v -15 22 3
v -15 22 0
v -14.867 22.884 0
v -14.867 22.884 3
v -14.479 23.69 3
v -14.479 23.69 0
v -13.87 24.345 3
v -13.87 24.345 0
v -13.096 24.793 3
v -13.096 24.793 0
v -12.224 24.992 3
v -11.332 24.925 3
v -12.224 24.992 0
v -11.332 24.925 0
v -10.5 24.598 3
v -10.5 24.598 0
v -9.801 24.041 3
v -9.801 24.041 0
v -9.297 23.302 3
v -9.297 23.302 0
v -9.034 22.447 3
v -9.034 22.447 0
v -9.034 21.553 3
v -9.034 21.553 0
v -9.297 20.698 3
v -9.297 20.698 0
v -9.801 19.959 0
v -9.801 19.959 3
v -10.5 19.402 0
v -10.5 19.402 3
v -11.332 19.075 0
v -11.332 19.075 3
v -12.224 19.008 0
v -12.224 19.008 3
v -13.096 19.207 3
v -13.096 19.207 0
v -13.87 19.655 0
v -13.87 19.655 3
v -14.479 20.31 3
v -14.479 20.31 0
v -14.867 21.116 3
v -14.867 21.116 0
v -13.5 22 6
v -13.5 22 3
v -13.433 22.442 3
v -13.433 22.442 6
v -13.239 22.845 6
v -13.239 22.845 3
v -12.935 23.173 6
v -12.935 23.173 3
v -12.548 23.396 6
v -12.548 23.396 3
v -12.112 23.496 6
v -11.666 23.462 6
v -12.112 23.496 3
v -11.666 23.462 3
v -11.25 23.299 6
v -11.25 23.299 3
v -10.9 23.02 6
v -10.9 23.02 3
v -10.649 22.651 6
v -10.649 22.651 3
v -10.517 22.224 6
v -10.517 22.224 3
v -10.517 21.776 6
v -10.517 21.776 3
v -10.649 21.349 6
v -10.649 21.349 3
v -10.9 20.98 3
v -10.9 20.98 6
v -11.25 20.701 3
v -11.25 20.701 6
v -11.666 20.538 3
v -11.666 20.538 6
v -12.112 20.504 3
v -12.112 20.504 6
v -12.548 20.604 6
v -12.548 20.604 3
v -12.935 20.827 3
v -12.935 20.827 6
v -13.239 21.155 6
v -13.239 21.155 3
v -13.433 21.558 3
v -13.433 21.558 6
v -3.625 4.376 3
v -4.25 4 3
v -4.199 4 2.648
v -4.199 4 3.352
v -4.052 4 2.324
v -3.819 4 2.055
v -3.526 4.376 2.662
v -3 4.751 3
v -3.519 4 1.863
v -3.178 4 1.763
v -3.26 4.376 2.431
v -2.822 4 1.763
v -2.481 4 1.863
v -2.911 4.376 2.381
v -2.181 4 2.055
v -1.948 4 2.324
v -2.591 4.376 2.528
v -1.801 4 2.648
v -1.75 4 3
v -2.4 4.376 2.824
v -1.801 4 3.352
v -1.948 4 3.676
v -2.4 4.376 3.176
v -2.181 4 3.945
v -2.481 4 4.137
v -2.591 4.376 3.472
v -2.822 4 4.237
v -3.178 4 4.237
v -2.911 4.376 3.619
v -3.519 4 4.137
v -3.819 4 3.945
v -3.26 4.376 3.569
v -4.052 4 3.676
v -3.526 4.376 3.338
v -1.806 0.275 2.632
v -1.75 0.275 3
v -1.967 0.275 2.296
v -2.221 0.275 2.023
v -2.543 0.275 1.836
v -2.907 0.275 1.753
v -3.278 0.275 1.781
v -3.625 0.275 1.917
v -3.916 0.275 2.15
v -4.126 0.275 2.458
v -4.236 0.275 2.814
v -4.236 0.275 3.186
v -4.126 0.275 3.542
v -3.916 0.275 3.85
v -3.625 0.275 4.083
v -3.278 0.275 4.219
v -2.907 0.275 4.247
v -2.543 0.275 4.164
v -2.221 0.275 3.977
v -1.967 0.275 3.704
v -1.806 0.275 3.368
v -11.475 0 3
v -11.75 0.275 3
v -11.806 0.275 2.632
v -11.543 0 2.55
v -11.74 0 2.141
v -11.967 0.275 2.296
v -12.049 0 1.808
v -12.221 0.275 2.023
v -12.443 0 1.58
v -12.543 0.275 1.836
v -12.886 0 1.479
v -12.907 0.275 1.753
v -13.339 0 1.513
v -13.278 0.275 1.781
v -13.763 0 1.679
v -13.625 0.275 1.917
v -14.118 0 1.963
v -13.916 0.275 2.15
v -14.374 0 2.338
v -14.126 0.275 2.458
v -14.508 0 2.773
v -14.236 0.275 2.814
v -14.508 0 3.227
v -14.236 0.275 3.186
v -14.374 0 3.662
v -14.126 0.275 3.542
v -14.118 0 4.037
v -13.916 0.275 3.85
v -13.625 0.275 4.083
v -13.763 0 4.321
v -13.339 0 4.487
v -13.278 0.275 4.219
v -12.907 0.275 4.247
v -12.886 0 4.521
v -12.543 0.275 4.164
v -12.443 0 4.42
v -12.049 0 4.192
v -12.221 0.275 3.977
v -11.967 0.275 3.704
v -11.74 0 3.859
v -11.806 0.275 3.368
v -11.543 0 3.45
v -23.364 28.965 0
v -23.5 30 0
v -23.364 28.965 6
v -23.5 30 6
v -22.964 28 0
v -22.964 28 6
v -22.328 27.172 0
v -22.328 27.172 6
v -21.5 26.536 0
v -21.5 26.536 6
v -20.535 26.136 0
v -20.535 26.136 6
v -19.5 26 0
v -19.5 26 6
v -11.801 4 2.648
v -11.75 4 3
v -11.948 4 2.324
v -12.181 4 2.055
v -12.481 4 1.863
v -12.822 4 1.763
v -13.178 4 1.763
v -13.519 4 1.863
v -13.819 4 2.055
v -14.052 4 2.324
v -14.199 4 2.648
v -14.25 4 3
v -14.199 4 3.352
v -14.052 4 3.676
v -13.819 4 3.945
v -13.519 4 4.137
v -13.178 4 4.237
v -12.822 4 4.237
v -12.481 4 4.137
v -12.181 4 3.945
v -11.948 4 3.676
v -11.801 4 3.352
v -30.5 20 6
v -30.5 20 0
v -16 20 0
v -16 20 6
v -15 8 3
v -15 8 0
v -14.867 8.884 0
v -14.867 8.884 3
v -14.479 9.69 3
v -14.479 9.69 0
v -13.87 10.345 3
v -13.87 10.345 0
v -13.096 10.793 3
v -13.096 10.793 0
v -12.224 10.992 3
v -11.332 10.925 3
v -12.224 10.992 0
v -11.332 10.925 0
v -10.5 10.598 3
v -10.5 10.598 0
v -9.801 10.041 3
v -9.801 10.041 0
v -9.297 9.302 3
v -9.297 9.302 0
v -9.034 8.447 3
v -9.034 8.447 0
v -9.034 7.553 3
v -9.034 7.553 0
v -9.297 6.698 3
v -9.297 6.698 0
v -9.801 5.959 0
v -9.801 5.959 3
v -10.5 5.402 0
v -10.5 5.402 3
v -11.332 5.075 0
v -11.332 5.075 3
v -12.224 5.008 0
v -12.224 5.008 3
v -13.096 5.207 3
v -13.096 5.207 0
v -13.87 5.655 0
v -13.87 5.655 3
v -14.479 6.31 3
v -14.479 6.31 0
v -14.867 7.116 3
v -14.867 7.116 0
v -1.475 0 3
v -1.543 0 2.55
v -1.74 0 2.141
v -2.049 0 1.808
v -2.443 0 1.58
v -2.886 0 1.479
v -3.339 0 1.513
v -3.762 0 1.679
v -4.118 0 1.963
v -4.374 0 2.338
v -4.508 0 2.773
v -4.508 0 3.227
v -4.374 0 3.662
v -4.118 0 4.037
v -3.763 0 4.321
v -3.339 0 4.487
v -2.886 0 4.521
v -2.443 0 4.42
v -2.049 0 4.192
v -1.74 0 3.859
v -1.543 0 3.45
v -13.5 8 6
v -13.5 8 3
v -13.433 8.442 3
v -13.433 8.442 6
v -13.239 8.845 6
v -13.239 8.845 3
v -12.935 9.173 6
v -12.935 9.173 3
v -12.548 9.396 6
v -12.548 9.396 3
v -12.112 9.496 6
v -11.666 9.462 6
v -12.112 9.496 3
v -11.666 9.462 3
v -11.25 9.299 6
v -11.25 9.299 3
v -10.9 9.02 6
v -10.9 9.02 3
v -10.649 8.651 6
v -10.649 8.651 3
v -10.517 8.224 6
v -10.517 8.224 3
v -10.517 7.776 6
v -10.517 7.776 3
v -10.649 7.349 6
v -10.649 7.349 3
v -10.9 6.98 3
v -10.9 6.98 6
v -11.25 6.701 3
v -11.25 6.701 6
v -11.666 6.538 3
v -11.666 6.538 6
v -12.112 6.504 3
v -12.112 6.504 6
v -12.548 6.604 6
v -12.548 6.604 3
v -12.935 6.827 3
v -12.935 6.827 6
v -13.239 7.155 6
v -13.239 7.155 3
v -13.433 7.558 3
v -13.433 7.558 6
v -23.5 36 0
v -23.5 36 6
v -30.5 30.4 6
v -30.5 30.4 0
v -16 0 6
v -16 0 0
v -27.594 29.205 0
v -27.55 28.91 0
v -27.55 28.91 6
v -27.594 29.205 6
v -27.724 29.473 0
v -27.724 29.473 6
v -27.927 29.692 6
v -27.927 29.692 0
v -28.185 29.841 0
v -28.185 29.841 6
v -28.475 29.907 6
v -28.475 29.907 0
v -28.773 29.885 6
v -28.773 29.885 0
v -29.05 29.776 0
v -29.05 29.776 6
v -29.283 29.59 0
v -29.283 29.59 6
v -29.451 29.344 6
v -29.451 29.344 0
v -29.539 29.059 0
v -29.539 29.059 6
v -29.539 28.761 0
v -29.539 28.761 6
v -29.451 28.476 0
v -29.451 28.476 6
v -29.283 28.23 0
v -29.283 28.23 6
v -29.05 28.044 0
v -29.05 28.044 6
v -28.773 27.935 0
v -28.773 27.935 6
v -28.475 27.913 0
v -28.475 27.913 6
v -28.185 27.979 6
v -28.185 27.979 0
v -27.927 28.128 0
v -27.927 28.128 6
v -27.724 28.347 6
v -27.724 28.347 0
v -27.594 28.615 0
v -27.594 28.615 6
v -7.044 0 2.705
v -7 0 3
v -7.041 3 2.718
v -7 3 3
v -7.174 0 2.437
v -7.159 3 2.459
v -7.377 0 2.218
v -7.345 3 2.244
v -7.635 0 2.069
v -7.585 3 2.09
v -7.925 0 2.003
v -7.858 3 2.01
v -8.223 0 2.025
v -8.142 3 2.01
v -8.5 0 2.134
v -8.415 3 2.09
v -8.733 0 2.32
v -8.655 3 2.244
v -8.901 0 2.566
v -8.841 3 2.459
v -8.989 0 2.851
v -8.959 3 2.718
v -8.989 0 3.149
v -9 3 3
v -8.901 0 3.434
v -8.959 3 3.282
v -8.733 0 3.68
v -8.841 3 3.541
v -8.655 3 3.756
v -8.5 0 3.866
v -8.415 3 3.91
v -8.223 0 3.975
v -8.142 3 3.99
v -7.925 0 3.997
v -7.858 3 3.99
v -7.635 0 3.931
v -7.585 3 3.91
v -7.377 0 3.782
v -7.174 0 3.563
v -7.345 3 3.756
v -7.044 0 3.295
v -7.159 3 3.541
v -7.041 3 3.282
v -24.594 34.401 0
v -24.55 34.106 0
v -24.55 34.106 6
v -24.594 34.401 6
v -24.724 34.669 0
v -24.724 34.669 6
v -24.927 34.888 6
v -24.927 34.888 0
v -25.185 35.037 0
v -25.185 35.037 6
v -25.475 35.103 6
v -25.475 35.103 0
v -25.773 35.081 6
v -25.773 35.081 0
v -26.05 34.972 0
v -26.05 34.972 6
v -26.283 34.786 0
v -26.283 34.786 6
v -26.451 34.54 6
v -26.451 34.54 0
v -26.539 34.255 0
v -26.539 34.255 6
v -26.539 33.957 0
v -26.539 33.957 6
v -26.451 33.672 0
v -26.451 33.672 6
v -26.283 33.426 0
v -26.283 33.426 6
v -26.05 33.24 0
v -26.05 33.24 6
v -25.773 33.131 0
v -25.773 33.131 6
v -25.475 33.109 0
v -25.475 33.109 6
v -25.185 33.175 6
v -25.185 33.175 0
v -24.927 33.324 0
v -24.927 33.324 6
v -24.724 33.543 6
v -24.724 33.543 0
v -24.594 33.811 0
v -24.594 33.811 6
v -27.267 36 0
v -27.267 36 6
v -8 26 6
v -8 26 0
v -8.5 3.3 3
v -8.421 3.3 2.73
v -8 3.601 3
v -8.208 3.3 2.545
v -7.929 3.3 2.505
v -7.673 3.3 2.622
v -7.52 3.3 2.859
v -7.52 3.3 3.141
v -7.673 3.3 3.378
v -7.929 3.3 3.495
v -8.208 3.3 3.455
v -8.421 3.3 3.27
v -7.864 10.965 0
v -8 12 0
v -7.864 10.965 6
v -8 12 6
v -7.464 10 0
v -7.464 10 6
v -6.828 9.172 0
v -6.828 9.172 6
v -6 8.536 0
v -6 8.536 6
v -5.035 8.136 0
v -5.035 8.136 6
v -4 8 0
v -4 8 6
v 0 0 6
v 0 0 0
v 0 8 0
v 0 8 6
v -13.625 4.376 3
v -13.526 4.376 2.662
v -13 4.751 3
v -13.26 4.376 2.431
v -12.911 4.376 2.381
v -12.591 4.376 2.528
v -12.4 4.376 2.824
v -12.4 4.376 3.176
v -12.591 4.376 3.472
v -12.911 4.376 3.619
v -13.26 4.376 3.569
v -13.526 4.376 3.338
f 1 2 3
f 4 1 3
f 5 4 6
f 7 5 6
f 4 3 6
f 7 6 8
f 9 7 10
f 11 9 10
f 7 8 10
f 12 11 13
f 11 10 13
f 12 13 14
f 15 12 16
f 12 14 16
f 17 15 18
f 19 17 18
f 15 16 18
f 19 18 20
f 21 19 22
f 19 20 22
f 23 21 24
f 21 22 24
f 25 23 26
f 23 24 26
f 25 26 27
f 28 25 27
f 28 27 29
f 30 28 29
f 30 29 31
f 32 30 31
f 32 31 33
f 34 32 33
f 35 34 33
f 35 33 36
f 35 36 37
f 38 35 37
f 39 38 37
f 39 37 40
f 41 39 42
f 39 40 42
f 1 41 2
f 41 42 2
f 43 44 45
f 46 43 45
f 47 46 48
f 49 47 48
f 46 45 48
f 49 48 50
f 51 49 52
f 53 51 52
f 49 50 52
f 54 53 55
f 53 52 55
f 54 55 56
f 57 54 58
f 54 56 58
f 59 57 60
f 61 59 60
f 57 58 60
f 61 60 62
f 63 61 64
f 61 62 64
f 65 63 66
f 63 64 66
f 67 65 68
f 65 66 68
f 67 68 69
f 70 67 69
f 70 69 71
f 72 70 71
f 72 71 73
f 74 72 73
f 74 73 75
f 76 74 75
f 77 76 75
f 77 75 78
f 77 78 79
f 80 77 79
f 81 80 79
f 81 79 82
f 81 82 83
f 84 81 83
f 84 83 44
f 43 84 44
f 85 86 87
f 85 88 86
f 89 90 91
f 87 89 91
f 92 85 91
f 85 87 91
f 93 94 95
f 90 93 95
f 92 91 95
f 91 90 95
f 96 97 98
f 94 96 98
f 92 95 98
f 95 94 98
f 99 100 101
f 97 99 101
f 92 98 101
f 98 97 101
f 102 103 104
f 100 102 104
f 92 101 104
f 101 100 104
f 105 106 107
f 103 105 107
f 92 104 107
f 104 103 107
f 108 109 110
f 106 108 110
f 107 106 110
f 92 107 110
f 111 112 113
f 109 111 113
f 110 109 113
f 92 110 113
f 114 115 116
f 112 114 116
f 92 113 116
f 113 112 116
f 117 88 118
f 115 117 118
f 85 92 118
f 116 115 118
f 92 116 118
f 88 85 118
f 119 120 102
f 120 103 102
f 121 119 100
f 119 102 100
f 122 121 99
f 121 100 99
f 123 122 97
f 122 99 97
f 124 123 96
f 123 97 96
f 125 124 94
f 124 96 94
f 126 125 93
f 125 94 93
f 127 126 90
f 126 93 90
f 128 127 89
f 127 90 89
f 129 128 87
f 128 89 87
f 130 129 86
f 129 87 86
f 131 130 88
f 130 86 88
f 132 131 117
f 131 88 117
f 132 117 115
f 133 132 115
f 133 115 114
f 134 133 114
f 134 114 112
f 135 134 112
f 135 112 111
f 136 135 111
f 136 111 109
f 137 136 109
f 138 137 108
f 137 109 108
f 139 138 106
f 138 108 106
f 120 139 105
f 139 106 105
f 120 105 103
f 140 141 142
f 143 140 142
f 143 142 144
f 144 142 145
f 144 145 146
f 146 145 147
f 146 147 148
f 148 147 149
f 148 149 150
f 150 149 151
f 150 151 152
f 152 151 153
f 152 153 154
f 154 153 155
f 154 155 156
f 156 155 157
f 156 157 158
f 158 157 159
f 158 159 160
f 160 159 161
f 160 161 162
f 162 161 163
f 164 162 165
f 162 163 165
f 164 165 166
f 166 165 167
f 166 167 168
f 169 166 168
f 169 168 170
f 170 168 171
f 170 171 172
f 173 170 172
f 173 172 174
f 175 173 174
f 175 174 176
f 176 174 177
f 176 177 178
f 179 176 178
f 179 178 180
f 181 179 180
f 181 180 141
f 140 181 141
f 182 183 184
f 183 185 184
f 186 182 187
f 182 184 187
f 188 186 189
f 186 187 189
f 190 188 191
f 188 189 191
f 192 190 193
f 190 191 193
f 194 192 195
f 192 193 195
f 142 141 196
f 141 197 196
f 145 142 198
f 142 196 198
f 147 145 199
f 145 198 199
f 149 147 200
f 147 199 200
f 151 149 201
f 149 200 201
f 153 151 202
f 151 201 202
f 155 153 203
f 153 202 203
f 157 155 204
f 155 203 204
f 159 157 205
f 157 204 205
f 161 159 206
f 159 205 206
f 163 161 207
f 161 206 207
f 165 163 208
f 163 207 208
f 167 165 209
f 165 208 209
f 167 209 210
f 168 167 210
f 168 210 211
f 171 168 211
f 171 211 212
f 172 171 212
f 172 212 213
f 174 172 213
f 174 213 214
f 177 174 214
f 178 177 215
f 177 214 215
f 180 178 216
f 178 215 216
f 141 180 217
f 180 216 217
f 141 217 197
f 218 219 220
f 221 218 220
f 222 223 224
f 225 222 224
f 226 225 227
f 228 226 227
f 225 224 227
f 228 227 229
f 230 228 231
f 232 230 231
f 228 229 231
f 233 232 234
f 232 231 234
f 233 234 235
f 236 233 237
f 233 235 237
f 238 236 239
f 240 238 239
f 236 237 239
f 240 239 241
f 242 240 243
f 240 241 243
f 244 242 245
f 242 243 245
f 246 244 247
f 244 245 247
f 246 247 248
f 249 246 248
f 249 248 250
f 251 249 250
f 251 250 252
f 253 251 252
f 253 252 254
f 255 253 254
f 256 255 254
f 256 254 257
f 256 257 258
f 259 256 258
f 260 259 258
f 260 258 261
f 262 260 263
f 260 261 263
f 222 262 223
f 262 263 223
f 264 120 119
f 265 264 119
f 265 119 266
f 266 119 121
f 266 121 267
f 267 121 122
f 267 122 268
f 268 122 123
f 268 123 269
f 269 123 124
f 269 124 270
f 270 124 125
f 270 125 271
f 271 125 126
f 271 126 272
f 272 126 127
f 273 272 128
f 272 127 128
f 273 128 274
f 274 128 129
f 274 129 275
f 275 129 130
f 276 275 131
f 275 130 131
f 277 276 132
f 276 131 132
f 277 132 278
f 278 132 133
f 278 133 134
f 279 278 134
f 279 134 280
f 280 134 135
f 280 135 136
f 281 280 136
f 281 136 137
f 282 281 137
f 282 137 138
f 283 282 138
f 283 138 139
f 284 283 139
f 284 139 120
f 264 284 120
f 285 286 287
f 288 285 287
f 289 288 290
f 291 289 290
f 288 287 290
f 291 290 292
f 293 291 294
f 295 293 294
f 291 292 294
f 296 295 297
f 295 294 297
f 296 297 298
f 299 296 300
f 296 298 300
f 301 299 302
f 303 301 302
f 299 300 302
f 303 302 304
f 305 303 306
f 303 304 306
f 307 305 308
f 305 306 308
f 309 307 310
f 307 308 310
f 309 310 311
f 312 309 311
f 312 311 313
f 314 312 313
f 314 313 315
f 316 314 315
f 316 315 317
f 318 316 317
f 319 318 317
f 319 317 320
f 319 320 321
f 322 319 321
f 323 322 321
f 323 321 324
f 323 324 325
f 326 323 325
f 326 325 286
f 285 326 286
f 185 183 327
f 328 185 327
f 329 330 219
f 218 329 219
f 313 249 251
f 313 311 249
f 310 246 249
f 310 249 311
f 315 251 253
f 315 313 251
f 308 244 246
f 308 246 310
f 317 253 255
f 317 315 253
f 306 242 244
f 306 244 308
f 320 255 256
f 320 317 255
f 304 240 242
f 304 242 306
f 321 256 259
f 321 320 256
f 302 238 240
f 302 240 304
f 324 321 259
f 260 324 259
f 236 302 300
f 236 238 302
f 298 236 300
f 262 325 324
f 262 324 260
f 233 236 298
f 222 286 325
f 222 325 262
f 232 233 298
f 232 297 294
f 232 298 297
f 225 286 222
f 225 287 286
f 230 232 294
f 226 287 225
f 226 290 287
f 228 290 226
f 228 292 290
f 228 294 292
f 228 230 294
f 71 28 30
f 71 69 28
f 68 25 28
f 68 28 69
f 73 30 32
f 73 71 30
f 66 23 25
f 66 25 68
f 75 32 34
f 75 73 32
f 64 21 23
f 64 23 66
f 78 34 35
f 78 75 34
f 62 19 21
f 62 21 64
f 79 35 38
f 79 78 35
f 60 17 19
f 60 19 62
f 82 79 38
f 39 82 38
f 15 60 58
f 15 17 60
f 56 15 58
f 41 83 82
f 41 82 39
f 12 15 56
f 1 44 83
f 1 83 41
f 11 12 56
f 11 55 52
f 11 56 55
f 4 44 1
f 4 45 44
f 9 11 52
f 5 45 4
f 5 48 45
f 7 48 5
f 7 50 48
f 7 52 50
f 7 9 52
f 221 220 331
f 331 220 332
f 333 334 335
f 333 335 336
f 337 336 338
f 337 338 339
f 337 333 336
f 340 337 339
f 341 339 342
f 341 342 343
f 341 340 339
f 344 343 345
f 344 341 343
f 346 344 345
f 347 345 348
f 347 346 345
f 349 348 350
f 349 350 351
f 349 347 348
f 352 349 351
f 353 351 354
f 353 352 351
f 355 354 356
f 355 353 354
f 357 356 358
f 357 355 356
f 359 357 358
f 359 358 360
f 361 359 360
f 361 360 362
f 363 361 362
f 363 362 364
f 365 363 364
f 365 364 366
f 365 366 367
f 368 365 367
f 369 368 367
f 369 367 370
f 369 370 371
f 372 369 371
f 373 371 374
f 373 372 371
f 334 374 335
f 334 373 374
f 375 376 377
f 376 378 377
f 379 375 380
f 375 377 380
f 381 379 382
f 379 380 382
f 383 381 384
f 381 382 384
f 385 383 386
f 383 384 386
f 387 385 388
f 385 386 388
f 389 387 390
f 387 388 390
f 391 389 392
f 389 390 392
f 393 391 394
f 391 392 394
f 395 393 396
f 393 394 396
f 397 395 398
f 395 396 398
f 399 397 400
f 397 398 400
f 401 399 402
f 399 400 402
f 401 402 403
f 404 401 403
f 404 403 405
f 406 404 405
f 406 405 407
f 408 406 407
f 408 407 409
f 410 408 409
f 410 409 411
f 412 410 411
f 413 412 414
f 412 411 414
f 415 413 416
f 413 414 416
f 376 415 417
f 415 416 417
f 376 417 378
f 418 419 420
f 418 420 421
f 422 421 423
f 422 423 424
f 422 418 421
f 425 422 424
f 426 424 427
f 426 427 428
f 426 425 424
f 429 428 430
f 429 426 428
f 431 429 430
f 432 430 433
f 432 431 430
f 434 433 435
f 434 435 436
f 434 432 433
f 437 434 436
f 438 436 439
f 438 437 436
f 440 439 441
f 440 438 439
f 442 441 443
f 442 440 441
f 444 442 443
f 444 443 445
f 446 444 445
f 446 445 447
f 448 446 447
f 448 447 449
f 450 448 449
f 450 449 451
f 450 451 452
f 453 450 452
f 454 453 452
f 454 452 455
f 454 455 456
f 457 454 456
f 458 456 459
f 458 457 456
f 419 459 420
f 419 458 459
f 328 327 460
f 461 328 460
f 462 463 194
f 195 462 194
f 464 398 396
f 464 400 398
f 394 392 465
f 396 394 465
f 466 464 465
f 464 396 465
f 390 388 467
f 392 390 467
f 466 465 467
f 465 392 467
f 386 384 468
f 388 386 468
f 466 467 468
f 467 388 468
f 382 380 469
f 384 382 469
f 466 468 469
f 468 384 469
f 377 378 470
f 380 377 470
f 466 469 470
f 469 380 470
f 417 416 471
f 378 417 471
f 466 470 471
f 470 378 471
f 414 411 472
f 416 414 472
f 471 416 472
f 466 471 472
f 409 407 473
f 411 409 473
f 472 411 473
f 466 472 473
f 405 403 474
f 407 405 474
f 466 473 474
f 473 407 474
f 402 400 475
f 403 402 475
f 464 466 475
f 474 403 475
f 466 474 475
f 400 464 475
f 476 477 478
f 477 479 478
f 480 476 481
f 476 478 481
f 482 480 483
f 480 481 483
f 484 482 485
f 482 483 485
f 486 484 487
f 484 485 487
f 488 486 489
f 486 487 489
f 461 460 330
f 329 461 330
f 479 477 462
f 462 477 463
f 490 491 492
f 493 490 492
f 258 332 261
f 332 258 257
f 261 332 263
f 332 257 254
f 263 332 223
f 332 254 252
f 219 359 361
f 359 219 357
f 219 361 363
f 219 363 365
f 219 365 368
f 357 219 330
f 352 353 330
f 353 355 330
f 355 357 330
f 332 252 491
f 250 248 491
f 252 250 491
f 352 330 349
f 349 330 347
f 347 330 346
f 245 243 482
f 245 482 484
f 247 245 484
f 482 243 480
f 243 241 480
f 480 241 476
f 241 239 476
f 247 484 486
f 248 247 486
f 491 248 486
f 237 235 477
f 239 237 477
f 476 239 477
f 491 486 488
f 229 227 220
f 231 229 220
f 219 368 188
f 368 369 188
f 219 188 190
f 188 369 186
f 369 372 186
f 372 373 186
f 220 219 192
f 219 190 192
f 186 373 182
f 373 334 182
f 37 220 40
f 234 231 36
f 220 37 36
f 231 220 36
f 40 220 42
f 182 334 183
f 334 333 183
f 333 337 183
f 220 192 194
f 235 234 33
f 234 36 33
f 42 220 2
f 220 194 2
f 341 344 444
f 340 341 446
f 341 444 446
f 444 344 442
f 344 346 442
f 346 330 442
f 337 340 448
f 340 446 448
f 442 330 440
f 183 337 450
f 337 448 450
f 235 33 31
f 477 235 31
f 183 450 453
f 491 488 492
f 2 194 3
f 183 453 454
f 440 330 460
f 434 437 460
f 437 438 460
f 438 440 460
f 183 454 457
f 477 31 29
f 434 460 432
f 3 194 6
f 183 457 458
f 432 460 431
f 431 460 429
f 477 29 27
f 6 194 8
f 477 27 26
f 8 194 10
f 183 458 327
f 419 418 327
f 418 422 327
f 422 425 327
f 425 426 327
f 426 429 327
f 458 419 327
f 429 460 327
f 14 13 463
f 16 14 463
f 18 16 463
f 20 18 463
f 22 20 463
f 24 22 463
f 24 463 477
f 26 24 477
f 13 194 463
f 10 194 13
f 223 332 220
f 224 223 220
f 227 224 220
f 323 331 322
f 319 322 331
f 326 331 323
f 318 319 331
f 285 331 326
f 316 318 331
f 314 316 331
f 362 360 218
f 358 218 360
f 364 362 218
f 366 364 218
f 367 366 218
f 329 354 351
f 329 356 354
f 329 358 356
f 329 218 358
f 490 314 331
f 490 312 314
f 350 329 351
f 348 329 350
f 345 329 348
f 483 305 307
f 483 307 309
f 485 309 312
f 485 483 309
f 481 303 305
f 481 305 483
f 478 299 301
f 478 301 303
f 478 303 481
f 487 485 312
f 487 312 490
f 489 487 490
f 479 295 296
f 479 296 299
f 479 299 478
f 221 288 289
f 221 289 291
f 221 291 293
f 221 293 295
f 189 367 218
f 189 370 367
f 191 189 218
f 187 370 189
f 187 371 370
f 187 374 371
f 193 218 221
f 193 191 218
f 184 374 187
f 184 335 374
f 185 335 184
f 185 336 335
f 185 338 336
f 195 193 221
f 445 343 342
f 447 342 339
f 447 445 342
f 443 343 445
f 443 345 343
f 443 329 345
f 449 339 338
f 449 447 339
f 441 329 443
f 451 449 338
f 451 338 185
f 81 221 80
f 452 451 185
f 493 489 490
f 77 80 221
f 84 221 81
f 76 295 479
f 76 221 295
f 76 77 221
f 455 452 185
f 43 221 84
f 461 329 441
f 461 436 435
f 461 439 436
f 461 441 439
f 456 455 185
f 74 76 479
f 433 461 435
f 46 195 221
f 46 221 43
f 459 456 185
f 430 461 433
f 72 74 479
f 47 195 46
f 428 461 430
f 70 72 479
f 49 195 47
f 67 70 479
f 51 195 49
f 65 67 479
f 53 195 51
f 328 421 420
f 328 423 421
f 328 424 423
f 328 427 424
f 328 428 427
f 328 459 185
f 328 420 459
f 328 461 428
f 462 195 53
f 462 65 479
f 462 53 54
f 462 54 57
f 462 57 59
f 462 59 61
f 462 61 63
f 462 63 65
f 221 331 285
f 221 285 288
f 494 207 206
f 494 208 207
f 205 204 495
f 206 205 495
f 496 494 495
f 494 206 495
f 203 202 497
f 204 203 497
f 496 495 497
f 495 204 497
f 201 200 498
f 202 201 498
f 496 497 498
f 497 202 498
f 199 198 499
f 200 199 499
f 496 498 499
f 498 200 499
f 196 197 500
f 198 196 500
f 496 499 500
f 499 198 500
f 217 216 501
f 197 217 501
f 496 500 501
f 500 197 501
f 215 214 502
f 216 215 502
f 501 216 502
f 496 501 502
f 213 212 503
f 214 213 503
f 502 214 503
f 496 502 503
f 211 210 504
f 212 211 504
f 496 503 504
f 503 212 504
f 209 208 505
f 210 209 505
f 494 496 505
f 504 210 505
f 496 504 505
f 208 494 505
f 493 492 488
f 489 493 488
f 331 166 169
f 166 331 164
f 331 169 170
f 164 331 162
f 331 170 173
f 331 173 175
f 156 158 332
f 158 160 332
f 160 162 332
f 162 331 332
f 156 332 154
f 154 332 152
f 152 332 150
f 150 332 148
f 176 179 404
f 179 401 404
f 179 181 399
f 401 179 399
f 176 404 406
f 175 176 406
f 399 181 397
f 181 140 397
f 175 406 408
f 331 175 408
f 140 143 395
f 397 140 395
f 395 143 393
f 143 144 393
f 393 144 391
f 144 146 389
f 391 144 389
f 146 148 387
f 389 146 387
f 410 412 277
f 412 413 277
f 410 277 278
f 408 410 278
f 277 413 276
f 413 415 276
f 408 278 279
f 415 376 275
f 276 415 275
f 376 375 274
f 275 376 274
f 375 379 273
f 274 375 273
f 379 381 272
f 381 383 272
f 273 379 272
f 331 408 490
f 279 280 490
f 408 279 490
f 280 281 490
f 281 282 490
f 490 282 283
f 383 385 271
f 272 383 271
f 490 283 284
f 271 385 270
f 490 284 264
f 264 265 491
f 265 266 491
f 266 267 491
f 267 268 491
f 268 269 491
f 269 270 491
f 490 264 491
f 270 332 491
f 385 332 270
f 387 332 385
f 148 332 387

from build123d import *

# Parameters (mm, degrees)
SKETCH1_R                       = 1
BOSS_EXTRUDE1_DEPTH             = 6
FILLET1_R                       = 4
FILLET2_R                       = 4
M3X0_5_TAPPED_HOLE1_D           = 2.5
M3X0_5_TAPPED_HOLE1_DEPTH       = 4
M3X0_5_TAPPED_HOLE1_CSINK_D     = 3.05
M3X0_5_TAPPED_HOLE1_CSINK_ANGLE = 90
M3X0_5_TAPPED_HOLE1_TIP         = 0.751075774
F_2_0_2_DIAMETER_HOLE1_D        = 2
F_2_0_2_DIAMETER_HOLE1_DEPTH    = 3
F_2_0_2_DIAMETER_HOLE1_TIP      = 0.600860619
SKETCH8_R                       = 3
CUT_EXTRUDE1_DEPTH              = 3
SKETCH9_R                       = 1.5
CUT_EXTRUDE2_DEPTH              = 4


with BuildPart() as part:
    # Sketch1 → Boss-Extrude1 (new body)
    with BuildSketch(Plane.XY):
        Polygon((-27.266838493, 36), (-30.5, 30.4), (-30.5, 26), (-30.5, 20), (-16, 20), (-16, 8), (-16, 0), (0, 0), (0, 8), (-8, 8), (-8, 26), (-16, 26), (-23.5, 26), (-23.5, 36), align=None)
        with Locations((-28.55, 28.91)):
            Circle(SKETCH1_R, mode=Mode.SUBTRACT)
        with Locations((-25.55, 34.106152423)):
            Circle(SKETCH1_R, mode=Mode.SUBTRACT)
    extrude(amount=BOSS_EXTRUDE1_DEPTH)

    # Fillet1
    fillet1_edges = [part.edges().sort_by_distance(p)[0] for p in [
        (-23.5, 26, 3),
    ]]
    fillet(fillet1_edges, radius=FILLET1_R)

    # Fillet2
    fillet2_edges = [part.edges().sort_by_distance(p)[0] for p in [
        (-8, 8, 3),
    ]]
    fillet(fillet2_edges, radius=FILLET2_R)

    # M3x0.5 Tapped Hole1
    with Locations(Plane(origin=(0, 0, 0), x_dir=(-1, 0, 0), z_dir=(0, -1, 0))):
        with Locations((13, -3), (3, -3)):
            CounterSinkHole(M3X0_5_TAPPED_HOLE1_D / 2, M3X0_5_TAPPED_HOLE1_CSINK_D / 2, depth=M3X0_5_TAPPED_HOLE1_DEPTH, counter_sink_angle=M3X0_5_TAPPED_HOLE1_CSINK_ANGLE)
            with Locations((0, 0, -(M3X0_5_TAPPED_HOLE1_DEPTH + M3X0_5_TAPPED_HOLE1_TIP / 2))):  # 118° drill point
                Cone(0, M3X0_5_TAPPED_HOLE1_D / 2, M3X0_5_TAPPED_HOLE1_TIP, mode=Mode.SUBTRACT)

    # Ø2.0 (2) Diameter Hole1
    with Locations(Plane(origin=(0, 0, 0), x_dir=(-1, 0, 0), z_dir=(0, -1, 0))):
        with Locations((8, -3)):
            Hole(F_2_0_2_DIAMETER_HOLE1_D / 2, depth=F_2_0_2_DIAMETER_HOLE1_DEPTH)
            with Locations((0, 0, -(F_2_0_2_DIAMETER_HOLE1_DEPTH + F_2_0_2_DIAMETER_HOLE1_TIP / 2))):  # 118° drill point
                Cone(0, F_2_0_2_DIAMETER_HOLE1_D / 2, F_2_0_2_DIAMETER_HOLE1_TIP, mode=Mode.SUBTRACT)

    # Sketch8 → Cut-Extrude1 (cut)
    with BuildSketch(Plane(origin=(0, 0, 0), x_dir=(-1, 0, 0), z_dir=(0, 0, -1))):
        with Locations((12, 22)):
            Circle(SKETCH8_R)
        with Locations((12, 8)):
            Circle(SKETCH8_R)
    extrude(amount=-CUT_EXTRUDE1_DEPTH, mode=Mode.SUBTRACT)

    # Sketch9 → Cut-Extrude2 (cut, through all)
    with BuildSketch(Plane(origin=(0, 0, 3), x_dir=(-1, 0, 0), z_dir=(0, 0, -1))):
        with Locations((12, 22)):
            Circle(SKETCH9_R)
        with Locations((12, 8)):
            Circle(SKETCH9_R)
    extrude(amount=-CUT_EXTRUDE2_DEPTH, mode=Mode.SUBTRACT)


solid = part.part
